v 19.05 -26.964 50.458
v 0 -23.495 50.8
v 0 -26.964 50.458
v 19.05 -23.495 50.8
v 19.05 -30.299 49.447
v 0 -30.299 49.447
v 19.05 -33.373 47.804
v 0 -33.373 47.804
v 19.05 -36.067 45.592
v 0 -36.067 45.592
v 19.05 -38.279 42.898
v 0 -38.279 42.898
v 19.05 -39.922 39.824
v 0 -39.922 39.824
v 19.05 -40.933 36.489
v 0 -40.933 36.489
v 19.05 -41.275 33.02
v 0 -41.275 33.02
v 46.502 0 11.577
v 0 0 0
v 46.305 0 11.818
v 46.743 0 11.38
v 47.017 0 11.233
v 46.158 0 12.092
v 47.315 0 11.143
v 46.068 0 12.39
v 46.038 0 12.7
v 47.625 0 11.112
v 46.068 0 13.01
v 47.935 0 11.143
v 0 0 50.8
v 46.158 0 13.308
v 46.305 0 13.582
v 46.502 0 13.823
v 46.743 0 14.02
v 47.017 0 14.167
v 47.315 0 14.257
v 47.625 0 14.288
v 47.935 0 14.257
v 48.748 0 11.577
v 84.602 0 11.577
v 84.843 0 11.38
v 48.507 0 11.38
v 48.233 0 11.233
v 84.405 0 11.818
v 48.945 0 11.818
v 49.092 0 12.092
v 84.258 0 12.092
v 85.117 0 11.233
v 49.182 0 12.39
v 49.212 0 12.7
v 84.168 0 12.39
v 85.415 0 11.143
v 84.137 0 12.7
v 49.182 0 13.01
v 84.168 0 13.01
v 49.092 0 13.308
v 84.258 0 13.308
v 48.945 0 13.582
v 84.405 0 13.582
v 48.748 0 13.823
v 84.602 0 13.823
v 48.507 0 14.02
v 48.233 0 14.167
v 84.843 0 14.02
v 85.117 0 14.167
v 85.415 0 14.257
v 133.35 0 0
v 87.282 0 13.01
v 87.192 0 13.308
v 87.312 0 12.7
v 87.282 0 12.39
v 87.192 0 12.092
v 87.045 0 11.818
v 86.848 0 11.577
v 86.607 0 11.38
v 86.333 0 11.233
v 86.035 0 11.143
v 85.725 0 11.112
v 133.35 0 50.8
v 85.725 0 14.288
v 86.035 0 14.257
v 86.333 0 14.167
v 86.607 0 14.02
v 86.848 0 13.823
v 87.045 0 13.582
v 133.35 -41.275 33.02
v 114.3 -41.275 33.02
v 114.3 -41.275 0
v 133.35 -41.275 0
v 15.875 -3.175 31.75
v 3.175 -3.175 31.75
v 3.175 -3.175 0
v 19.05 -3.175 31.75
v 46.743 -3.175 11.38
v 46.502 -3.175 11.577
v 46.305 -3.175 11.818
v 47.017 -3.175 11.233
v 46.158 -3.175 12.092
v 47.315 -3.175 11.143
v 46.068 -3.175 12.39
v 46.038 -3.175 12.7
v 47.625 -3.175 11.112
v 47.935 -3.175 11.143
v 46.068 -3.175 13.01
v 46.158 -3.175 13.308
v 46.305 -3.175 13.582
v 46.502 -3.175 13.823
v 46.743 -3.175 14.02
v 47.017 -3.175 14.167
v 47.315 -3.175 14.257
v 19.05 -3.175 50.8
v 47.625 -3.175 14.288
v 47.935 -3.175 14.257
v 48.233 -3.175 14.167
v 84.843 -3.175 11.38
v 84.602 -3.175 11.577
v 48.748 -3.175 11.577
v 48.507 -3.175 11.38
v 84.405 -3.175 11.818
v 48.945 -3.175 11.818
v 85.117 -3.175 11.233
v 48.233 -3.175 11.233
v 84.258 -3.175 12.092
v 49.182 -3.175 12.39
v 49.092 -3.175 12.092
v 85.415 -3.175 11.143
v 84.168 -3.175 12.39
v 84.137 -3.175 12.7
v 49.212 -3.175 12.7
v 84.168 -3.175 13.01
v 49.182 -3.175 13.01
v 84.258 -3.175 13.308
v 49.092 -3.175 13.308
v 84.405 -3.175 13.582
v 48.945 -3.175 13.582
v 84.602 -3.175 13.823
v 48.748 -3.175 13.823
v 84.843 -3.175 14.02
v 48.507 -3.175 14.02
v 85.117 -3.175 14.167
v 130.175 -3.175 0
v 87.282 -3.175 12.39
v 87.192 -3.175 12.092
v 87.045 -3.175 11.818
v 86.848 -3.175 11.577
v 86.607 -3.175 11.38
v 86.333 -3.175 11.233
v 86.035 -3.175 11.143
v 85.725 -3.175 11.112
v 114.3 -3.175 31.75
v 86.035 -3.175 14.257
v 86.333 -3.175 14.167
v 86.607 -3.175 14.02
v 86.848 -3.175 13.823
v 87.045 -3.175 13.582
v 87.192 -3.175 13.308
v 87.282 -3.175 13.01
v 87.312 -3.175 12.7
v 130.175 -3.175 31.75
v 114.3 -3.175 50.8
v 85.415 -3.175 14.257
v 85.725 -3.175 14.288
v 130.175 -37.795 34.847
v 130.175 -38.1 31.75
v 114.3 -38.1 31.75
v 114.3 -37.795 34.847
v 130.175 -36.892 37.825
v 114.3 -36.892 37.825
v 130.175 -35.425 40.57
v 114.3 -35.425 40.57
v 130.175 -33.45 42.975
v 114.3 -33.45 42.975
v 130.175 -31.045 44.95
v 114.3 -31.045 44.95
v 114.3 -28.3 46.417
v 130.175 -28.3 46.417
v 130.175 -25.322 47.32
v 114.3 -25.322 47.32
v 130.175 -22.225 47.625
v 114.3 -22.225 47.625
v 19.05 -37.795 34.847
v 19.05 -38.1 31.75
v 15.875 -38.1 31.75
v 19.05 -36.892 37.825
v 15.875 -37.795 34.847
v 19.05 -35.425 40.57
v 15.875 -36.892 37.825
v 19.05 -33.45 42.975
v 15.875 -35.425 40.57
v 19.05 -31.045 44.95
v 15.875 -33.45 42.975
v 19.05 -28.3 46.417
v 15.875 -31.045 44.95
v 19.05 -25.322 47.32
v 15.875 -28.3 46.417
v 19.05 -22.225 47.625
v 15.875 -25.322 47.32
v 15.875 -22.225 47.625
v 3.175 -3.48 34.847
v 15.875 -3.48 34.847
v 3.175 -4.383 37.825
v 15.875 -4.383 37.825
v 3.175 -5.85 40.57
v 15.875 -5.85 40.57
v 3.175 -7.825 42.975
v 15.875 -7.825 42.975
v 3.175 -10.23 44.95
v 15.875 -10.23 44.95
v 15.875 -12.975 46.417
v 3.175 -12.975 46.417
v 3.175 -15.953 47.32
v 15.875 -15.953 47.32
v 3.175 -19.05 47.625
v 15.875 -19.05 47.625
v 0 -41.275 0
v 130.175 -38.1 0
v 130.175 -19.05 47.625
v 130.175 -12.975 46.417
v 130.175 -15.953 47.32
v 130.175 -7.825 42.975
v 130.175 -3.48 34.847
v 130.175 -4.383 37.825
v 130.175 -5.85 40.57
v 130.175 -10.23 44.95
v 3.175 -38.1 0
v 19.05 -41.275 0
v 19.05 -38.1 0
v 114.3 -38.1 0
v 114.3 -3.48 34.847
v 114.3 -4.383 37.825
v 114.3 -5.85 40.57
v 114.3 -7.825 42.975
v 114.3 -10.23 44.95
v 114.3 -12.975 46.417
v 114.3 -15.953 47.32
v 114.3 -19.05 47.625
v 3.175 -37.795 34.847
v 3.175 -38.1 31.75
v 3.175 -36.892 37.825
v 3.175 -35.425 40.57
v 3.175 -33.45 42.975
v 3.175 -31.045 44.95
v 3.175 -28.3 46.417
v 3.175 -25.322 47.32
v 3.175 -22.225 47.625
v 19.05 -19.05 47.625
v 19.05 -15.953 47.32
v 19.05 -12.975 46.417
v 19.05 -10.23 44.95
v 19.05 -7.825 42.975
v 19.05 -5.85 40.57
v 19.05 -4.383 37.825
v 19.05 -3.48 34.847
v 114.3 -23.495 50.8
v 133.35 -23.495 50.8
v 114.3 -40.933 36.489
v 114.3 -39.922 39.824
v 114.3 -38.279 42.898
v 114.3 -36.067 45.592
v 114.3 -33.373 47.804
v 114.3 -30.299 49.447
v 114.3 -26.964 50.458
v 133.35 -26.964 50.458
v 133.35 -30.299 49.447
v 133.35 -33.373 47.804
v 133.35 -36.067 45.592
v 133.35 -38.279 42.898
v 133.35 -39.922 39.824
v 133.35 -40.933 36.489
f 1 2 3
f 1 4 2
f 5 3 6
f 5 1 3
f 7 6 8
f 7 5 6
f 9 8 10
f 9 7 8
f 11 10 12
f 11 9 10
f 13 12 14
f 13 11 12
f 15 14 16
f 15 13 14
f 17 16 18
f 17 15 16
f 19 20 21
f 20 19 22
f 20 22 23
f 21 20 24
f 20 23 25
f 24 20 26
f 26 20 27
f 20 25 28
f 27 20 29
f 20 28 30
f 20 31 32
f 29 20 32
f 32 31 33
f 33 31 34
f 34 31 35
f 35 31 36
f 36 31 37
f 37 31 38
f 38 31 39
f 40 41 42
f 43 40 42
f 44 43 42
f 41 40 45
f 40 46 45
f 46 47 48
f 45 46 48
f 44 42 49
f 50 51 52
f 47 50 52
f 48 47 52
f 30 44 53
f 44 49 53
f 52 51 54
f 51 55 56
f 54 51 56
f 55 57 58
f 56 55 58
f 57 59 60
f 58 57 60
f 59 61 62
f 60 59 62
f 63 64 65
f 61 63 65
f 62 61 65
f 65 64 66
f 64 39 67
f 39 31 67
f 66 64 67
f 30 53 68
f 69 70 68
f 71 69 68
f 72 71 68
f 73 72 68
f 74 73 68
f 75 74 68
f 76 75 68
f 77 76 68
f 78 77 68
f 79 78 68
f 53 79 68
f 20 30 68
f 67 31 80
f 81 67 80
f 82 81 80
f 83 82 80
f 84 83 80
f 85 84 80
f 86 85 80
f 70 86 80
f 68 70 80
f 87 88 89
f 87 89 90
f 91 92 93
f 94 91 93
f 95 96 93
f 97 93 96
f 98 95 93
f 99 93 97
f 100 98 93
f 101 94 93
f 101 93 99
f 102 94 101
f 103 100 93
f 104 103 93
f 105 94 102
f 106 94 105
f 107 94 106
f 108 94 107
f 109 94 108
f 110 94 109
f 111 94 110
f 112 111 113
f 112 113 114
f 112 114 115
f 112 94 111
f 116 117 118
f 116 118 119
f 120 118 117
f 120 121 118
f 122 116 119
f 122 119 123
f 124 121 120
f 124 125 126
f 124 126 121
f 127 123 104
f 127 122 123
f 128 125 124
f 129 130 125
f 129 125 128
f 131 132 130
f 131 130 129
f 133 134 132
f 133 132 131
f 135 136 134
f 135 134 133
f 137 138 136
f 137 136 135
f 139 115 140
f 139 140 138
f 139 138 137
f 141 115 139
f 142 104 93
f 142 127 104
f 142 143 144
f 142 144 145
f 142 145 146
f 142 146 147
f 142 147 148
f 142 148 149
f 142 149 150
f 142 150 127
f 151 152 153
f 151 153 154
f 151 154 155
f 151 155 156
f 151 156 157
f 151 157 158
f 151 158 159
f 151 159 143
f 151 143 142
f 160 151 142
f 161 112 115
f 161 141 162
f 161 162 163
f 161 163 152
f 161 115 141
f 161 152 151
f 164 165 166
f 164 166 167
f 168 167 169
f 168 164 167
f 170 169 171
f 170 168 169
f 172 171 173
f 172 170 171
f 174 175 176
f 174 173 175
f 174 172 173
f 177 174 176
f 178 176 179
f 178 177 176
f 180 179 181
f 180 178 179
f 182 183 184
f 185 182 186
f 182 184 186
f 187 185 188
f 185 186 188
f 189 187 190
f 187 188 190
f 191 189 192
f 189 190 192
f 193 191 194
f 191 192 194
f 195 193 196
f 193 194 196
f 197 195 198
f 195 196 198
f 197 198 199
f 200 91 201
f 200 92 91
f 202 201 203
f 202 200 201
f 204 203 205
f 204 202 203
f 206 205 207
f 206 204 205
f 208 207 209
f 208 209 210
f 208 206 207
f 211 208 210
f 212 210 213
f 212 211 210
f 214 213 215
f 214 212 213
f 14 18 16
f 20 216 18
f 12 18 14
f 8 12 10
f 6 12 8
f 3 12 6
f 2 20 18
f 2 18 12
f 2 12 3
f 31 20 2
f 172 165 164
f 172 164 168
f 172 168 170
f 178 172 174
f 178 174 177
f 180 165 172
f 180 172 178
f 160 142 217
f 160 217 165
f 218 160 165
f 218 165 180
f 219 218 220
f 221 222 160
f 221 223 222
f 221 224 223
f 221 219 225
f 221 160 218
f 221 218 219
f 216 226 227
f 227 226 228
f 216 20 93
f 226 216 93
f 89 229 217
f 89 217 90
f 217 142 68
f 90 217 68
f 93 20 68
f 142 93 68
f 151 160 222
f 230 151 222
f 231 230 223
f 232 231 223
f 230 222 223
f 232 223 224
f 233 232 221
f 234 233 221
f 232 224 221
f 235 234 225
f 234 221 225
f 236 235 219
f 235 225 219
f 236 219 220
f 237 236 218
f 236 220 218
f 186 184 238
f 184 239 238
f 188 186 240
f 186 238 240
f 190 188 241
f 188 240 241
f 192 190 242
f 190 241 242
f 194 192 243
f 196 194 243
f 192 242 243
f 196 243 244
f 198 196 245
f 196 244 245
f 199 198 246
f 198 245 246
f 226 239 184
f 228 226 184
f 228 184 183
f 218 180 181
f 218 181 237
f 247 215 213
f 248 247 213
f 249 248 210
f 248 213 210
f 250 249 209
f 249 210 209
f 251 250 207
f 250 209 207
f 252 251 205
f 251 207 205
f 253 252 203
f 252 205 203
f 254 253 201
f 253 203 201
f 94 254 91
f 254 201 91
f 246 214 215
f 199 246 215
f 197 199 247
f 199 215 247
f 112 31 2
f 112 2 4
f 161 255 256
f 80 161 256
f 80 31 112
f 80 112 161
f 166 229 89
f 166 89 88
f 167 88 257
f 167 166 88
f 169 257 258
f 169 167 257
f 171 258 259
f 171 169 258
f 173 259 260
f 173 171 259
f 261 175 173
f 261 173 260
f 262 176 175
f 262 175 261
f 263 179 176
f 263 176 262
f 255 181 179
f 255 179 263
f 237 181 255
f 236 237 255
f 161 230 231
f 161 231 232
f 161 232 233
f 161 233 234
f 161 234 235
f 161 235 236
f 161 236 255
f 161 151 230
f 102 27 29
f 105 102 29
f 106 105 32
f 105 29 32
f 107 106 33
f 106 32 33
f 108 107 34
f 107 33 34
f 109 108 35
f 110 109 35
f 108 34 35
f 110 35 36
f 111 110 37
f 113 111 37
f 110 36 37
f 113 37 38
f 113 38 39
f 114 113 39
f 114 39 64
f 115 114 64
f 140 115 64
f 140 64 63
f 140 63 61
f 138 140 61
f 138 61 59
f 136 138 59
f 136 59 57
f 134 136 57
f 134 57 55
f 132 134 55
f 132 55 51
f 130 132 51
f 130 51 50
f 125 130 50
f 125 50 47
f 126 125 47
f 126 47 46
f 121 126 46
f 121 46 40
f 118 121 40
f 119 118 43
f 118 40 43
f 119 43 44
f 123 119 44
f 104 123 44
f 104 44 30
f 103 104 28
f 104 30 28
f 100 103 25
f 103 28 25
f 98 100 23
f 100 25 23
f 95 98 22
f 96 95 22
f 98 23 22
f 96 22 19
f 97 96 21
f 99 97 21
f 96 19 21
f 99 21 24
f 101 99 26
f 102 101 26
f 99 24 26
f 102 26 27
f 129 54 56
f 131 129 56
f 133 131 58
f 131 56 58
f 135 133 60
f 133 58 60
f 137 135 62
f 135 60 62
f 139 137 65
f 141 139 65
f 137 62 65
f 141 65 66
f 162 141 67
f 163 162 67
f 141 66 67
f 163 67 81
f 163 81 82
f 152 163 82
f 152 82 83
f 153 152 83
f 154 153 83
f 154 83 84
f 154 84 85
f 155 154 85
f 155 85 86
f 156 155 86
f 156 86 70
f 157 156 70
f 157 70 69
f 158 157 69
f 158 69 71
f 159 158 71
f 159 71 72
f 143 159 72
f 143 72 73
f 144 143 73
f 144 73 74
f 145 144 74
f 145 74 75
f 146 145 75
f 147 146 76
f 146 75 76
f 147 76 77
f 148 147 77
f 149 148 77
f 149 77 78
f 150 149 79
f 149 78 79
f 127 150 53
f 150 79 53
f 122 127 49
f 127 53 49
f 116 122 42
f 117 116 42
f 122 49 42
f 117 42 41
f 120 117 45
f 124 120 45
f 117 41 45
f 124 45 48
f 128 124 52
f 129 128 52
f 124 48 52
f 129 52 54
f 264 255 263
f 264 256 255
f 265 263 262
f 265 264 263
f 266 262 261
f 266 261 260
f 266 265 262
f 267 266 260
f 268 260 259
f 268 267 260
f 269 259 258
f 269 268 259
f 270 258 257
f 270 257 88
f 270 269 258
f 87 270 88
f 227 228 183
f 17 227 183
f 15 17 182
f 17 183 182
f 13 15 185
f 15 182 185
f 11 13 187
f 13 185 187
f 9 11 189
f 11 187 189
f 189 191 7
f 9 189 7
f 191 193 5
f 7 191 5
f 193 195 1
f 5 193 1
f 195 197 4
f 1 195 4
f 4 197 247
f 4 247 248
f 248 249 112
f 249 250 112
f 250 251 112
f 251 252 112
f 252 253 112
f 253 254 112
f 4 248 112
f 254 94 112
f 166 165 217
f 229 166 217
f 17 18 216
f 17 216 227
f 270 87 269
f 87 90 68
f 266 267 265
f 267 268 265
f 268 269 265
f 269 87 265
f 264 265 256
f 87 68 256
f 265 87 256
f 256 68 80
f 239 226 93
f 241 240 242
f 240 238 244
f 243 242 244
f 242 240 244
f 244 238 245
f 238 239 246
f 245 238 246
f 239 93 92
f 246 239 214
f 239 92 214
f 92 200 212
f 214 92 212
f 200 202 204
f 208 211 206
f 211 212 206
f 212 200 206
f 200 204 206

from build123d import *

# Parameters (mm, degrees)
F0_W        = 133.35
F0_H        = 50.8
F1_DEPTH    = 3.175
F2_W        = 19.05
F2_H        = 50.8
F3_DEPTH    = 38.1
F4_T        = 3.175
F4_T3_DEPTH = 57.15
F5_R        = 15.875
F7_DEPTH    = 25.4
F8_DEPTH    = 25.4
F9_R        = 1.5875
F10_DEPTH   = 25.4
F11_R       = 17.78


# Not quite as in the source:
# - a shell that OpenCascade refuses in one call is made with other operations: the cavity is built on its own and cut out


with BuildPart() as f1:
    # F0 (on Front) → F1 (new body)
    with BuildSketch(Plane.XZ):
        with Locations((66.675, 25.4)):
            Rectangle(F0_W, F0_H)
    extrude(amount=F1_DEPTH)

    # F2 (on face) → F3 (join)
    with BuildSketch(Plane.XZ.offset(3.175)):
        with Locations((9.525, 25.4)):
            Rectangle(F2_W, F2_H)
        with Locations((123.825, 25.4)):
            Rectangle(F2_W, F2_H)
    extrude(amount=F3_DEPTH)

    # F4: shell of thickness 3.175, made by hand


with BuildPart() as f4_core1:
    # F4_t2: copy of F1
    add(f1.part)

    # the walls: a layer under each face that stays
    f4_faces = [f4_core1.faces().sort_by_distance(p)[0] for p in [
        (0, -20.6375, 25.4),
        (66.675, 0, 25.4),
        (133.35, -20.6375, 25.4),
        (123.825, -41.275, 25.4),
        (114.3, -22.225, 25.4),
        (66.675, -3.175, 25.4),
        (19.05, -22.225, 25.4),
        (9.525, -41.275, 25.4),
        (123.825, -38.3267857143, 50.8),
    ]]
    thicken(f4_faces, amount=-F4_T, mode=Mode.SUBTRACT)

    # F4_s4 → F4_t3 (cut)
    with BuildSketch(Plane.XY.offset(-3.175)):
        Polygon((114.26825, -3.20675), (117.475, -3.175), (117.475, 0), (114.3, 0), align=None)
        Polygon((19.08175, -3.20675), (19.05, 0), (15.875, 0), (15.875, -3.175), align=None)
    extrude(amount=F4_T3_DEPTH, mode=Mode.SUBTRACT)


with BuildPart() as f1_1:
    add(f1.part)

    # what is left inside the walls is the cavity
    f4_cavity = [f4_core1.part.solids().sort_by_distance(p)[0] for p in [
        (3.20675, -26.458333, 23.8125),
        (130.14325, -26.458333, 23.8125),
    ]]
    add(f4_cavity, mode=Mode.SUBTRACT)

    # F5
    f5_edges = [f1_1.edges().sort_by_distance(p)[0] for p in [
        (9.525, -3.175, 47.625),
        (123.825, -3.175, 47.625),
        (9.525, -38.1, 47.625),
        (123.825, -38.1, 47.625),
    ]]
    fillet(f5_edges, radius=F5_R)

    # F6 (on face) → F7 (cut)
    with BuildSketch(Plane(origin=(15.875, 0, 0), x_dir=(0, -1, 0), z_dir=(-1, 0, 0))):
        with BuildLine():
            ThreePointArc((19.05, 47.625), (7.8246798487, 42.9753201513), (3.175, 31.75))
            Line((3.175, 31.75), (3.175, 0))
            Line((3.175, 0), (38.1, 0))
            Line((38.1, 0), (38.1, 31.75))
            ThreePointArc((38.1, 31.75), (33.4503201513, 42.9753201513), (22.225, 47.625))
            Line((22.225, 47.625), (19.05, 47.625))
        make_face()
    extrude(amount=-F7_DEPTH, mode=Mode.SUBTRACT)

    # F8 (cut): a face of the model
    f8_faces = [f1_1.faces().sort_by_distance(p)[0] for p in [
        (117.475, -20.6375, 22.4028811498),
    ]]
    extrude(f8_faces, amount=-F8_DEPTH, mode=Mode.SUBTRACT)

    # F9 (on face) → F10 (cut)
    with BuildSketch(Plane(origin=(0, 0, 0), x_dir=(-1, 0, 0), z_dir=(0, 1, 0))):
        with Locations((-47.625, 12.7)):
            Circle(F9_R)
        with Locations((-85.725, 12.7)):
            Circle(F9_R)
    extrude(amount=-F10_DEPTH, mode=Mode.SUBTRACT)

    # F11
    f11_edges = [f1_1.edges().sort_by_distance(p)[0] for p in [
        (9.525, -41.275, 50.8),
        (123.825, -41.275, 50.8),
    ]]
    fillet(f11_edges, radius=F11_R)


solid = f1_1.part
